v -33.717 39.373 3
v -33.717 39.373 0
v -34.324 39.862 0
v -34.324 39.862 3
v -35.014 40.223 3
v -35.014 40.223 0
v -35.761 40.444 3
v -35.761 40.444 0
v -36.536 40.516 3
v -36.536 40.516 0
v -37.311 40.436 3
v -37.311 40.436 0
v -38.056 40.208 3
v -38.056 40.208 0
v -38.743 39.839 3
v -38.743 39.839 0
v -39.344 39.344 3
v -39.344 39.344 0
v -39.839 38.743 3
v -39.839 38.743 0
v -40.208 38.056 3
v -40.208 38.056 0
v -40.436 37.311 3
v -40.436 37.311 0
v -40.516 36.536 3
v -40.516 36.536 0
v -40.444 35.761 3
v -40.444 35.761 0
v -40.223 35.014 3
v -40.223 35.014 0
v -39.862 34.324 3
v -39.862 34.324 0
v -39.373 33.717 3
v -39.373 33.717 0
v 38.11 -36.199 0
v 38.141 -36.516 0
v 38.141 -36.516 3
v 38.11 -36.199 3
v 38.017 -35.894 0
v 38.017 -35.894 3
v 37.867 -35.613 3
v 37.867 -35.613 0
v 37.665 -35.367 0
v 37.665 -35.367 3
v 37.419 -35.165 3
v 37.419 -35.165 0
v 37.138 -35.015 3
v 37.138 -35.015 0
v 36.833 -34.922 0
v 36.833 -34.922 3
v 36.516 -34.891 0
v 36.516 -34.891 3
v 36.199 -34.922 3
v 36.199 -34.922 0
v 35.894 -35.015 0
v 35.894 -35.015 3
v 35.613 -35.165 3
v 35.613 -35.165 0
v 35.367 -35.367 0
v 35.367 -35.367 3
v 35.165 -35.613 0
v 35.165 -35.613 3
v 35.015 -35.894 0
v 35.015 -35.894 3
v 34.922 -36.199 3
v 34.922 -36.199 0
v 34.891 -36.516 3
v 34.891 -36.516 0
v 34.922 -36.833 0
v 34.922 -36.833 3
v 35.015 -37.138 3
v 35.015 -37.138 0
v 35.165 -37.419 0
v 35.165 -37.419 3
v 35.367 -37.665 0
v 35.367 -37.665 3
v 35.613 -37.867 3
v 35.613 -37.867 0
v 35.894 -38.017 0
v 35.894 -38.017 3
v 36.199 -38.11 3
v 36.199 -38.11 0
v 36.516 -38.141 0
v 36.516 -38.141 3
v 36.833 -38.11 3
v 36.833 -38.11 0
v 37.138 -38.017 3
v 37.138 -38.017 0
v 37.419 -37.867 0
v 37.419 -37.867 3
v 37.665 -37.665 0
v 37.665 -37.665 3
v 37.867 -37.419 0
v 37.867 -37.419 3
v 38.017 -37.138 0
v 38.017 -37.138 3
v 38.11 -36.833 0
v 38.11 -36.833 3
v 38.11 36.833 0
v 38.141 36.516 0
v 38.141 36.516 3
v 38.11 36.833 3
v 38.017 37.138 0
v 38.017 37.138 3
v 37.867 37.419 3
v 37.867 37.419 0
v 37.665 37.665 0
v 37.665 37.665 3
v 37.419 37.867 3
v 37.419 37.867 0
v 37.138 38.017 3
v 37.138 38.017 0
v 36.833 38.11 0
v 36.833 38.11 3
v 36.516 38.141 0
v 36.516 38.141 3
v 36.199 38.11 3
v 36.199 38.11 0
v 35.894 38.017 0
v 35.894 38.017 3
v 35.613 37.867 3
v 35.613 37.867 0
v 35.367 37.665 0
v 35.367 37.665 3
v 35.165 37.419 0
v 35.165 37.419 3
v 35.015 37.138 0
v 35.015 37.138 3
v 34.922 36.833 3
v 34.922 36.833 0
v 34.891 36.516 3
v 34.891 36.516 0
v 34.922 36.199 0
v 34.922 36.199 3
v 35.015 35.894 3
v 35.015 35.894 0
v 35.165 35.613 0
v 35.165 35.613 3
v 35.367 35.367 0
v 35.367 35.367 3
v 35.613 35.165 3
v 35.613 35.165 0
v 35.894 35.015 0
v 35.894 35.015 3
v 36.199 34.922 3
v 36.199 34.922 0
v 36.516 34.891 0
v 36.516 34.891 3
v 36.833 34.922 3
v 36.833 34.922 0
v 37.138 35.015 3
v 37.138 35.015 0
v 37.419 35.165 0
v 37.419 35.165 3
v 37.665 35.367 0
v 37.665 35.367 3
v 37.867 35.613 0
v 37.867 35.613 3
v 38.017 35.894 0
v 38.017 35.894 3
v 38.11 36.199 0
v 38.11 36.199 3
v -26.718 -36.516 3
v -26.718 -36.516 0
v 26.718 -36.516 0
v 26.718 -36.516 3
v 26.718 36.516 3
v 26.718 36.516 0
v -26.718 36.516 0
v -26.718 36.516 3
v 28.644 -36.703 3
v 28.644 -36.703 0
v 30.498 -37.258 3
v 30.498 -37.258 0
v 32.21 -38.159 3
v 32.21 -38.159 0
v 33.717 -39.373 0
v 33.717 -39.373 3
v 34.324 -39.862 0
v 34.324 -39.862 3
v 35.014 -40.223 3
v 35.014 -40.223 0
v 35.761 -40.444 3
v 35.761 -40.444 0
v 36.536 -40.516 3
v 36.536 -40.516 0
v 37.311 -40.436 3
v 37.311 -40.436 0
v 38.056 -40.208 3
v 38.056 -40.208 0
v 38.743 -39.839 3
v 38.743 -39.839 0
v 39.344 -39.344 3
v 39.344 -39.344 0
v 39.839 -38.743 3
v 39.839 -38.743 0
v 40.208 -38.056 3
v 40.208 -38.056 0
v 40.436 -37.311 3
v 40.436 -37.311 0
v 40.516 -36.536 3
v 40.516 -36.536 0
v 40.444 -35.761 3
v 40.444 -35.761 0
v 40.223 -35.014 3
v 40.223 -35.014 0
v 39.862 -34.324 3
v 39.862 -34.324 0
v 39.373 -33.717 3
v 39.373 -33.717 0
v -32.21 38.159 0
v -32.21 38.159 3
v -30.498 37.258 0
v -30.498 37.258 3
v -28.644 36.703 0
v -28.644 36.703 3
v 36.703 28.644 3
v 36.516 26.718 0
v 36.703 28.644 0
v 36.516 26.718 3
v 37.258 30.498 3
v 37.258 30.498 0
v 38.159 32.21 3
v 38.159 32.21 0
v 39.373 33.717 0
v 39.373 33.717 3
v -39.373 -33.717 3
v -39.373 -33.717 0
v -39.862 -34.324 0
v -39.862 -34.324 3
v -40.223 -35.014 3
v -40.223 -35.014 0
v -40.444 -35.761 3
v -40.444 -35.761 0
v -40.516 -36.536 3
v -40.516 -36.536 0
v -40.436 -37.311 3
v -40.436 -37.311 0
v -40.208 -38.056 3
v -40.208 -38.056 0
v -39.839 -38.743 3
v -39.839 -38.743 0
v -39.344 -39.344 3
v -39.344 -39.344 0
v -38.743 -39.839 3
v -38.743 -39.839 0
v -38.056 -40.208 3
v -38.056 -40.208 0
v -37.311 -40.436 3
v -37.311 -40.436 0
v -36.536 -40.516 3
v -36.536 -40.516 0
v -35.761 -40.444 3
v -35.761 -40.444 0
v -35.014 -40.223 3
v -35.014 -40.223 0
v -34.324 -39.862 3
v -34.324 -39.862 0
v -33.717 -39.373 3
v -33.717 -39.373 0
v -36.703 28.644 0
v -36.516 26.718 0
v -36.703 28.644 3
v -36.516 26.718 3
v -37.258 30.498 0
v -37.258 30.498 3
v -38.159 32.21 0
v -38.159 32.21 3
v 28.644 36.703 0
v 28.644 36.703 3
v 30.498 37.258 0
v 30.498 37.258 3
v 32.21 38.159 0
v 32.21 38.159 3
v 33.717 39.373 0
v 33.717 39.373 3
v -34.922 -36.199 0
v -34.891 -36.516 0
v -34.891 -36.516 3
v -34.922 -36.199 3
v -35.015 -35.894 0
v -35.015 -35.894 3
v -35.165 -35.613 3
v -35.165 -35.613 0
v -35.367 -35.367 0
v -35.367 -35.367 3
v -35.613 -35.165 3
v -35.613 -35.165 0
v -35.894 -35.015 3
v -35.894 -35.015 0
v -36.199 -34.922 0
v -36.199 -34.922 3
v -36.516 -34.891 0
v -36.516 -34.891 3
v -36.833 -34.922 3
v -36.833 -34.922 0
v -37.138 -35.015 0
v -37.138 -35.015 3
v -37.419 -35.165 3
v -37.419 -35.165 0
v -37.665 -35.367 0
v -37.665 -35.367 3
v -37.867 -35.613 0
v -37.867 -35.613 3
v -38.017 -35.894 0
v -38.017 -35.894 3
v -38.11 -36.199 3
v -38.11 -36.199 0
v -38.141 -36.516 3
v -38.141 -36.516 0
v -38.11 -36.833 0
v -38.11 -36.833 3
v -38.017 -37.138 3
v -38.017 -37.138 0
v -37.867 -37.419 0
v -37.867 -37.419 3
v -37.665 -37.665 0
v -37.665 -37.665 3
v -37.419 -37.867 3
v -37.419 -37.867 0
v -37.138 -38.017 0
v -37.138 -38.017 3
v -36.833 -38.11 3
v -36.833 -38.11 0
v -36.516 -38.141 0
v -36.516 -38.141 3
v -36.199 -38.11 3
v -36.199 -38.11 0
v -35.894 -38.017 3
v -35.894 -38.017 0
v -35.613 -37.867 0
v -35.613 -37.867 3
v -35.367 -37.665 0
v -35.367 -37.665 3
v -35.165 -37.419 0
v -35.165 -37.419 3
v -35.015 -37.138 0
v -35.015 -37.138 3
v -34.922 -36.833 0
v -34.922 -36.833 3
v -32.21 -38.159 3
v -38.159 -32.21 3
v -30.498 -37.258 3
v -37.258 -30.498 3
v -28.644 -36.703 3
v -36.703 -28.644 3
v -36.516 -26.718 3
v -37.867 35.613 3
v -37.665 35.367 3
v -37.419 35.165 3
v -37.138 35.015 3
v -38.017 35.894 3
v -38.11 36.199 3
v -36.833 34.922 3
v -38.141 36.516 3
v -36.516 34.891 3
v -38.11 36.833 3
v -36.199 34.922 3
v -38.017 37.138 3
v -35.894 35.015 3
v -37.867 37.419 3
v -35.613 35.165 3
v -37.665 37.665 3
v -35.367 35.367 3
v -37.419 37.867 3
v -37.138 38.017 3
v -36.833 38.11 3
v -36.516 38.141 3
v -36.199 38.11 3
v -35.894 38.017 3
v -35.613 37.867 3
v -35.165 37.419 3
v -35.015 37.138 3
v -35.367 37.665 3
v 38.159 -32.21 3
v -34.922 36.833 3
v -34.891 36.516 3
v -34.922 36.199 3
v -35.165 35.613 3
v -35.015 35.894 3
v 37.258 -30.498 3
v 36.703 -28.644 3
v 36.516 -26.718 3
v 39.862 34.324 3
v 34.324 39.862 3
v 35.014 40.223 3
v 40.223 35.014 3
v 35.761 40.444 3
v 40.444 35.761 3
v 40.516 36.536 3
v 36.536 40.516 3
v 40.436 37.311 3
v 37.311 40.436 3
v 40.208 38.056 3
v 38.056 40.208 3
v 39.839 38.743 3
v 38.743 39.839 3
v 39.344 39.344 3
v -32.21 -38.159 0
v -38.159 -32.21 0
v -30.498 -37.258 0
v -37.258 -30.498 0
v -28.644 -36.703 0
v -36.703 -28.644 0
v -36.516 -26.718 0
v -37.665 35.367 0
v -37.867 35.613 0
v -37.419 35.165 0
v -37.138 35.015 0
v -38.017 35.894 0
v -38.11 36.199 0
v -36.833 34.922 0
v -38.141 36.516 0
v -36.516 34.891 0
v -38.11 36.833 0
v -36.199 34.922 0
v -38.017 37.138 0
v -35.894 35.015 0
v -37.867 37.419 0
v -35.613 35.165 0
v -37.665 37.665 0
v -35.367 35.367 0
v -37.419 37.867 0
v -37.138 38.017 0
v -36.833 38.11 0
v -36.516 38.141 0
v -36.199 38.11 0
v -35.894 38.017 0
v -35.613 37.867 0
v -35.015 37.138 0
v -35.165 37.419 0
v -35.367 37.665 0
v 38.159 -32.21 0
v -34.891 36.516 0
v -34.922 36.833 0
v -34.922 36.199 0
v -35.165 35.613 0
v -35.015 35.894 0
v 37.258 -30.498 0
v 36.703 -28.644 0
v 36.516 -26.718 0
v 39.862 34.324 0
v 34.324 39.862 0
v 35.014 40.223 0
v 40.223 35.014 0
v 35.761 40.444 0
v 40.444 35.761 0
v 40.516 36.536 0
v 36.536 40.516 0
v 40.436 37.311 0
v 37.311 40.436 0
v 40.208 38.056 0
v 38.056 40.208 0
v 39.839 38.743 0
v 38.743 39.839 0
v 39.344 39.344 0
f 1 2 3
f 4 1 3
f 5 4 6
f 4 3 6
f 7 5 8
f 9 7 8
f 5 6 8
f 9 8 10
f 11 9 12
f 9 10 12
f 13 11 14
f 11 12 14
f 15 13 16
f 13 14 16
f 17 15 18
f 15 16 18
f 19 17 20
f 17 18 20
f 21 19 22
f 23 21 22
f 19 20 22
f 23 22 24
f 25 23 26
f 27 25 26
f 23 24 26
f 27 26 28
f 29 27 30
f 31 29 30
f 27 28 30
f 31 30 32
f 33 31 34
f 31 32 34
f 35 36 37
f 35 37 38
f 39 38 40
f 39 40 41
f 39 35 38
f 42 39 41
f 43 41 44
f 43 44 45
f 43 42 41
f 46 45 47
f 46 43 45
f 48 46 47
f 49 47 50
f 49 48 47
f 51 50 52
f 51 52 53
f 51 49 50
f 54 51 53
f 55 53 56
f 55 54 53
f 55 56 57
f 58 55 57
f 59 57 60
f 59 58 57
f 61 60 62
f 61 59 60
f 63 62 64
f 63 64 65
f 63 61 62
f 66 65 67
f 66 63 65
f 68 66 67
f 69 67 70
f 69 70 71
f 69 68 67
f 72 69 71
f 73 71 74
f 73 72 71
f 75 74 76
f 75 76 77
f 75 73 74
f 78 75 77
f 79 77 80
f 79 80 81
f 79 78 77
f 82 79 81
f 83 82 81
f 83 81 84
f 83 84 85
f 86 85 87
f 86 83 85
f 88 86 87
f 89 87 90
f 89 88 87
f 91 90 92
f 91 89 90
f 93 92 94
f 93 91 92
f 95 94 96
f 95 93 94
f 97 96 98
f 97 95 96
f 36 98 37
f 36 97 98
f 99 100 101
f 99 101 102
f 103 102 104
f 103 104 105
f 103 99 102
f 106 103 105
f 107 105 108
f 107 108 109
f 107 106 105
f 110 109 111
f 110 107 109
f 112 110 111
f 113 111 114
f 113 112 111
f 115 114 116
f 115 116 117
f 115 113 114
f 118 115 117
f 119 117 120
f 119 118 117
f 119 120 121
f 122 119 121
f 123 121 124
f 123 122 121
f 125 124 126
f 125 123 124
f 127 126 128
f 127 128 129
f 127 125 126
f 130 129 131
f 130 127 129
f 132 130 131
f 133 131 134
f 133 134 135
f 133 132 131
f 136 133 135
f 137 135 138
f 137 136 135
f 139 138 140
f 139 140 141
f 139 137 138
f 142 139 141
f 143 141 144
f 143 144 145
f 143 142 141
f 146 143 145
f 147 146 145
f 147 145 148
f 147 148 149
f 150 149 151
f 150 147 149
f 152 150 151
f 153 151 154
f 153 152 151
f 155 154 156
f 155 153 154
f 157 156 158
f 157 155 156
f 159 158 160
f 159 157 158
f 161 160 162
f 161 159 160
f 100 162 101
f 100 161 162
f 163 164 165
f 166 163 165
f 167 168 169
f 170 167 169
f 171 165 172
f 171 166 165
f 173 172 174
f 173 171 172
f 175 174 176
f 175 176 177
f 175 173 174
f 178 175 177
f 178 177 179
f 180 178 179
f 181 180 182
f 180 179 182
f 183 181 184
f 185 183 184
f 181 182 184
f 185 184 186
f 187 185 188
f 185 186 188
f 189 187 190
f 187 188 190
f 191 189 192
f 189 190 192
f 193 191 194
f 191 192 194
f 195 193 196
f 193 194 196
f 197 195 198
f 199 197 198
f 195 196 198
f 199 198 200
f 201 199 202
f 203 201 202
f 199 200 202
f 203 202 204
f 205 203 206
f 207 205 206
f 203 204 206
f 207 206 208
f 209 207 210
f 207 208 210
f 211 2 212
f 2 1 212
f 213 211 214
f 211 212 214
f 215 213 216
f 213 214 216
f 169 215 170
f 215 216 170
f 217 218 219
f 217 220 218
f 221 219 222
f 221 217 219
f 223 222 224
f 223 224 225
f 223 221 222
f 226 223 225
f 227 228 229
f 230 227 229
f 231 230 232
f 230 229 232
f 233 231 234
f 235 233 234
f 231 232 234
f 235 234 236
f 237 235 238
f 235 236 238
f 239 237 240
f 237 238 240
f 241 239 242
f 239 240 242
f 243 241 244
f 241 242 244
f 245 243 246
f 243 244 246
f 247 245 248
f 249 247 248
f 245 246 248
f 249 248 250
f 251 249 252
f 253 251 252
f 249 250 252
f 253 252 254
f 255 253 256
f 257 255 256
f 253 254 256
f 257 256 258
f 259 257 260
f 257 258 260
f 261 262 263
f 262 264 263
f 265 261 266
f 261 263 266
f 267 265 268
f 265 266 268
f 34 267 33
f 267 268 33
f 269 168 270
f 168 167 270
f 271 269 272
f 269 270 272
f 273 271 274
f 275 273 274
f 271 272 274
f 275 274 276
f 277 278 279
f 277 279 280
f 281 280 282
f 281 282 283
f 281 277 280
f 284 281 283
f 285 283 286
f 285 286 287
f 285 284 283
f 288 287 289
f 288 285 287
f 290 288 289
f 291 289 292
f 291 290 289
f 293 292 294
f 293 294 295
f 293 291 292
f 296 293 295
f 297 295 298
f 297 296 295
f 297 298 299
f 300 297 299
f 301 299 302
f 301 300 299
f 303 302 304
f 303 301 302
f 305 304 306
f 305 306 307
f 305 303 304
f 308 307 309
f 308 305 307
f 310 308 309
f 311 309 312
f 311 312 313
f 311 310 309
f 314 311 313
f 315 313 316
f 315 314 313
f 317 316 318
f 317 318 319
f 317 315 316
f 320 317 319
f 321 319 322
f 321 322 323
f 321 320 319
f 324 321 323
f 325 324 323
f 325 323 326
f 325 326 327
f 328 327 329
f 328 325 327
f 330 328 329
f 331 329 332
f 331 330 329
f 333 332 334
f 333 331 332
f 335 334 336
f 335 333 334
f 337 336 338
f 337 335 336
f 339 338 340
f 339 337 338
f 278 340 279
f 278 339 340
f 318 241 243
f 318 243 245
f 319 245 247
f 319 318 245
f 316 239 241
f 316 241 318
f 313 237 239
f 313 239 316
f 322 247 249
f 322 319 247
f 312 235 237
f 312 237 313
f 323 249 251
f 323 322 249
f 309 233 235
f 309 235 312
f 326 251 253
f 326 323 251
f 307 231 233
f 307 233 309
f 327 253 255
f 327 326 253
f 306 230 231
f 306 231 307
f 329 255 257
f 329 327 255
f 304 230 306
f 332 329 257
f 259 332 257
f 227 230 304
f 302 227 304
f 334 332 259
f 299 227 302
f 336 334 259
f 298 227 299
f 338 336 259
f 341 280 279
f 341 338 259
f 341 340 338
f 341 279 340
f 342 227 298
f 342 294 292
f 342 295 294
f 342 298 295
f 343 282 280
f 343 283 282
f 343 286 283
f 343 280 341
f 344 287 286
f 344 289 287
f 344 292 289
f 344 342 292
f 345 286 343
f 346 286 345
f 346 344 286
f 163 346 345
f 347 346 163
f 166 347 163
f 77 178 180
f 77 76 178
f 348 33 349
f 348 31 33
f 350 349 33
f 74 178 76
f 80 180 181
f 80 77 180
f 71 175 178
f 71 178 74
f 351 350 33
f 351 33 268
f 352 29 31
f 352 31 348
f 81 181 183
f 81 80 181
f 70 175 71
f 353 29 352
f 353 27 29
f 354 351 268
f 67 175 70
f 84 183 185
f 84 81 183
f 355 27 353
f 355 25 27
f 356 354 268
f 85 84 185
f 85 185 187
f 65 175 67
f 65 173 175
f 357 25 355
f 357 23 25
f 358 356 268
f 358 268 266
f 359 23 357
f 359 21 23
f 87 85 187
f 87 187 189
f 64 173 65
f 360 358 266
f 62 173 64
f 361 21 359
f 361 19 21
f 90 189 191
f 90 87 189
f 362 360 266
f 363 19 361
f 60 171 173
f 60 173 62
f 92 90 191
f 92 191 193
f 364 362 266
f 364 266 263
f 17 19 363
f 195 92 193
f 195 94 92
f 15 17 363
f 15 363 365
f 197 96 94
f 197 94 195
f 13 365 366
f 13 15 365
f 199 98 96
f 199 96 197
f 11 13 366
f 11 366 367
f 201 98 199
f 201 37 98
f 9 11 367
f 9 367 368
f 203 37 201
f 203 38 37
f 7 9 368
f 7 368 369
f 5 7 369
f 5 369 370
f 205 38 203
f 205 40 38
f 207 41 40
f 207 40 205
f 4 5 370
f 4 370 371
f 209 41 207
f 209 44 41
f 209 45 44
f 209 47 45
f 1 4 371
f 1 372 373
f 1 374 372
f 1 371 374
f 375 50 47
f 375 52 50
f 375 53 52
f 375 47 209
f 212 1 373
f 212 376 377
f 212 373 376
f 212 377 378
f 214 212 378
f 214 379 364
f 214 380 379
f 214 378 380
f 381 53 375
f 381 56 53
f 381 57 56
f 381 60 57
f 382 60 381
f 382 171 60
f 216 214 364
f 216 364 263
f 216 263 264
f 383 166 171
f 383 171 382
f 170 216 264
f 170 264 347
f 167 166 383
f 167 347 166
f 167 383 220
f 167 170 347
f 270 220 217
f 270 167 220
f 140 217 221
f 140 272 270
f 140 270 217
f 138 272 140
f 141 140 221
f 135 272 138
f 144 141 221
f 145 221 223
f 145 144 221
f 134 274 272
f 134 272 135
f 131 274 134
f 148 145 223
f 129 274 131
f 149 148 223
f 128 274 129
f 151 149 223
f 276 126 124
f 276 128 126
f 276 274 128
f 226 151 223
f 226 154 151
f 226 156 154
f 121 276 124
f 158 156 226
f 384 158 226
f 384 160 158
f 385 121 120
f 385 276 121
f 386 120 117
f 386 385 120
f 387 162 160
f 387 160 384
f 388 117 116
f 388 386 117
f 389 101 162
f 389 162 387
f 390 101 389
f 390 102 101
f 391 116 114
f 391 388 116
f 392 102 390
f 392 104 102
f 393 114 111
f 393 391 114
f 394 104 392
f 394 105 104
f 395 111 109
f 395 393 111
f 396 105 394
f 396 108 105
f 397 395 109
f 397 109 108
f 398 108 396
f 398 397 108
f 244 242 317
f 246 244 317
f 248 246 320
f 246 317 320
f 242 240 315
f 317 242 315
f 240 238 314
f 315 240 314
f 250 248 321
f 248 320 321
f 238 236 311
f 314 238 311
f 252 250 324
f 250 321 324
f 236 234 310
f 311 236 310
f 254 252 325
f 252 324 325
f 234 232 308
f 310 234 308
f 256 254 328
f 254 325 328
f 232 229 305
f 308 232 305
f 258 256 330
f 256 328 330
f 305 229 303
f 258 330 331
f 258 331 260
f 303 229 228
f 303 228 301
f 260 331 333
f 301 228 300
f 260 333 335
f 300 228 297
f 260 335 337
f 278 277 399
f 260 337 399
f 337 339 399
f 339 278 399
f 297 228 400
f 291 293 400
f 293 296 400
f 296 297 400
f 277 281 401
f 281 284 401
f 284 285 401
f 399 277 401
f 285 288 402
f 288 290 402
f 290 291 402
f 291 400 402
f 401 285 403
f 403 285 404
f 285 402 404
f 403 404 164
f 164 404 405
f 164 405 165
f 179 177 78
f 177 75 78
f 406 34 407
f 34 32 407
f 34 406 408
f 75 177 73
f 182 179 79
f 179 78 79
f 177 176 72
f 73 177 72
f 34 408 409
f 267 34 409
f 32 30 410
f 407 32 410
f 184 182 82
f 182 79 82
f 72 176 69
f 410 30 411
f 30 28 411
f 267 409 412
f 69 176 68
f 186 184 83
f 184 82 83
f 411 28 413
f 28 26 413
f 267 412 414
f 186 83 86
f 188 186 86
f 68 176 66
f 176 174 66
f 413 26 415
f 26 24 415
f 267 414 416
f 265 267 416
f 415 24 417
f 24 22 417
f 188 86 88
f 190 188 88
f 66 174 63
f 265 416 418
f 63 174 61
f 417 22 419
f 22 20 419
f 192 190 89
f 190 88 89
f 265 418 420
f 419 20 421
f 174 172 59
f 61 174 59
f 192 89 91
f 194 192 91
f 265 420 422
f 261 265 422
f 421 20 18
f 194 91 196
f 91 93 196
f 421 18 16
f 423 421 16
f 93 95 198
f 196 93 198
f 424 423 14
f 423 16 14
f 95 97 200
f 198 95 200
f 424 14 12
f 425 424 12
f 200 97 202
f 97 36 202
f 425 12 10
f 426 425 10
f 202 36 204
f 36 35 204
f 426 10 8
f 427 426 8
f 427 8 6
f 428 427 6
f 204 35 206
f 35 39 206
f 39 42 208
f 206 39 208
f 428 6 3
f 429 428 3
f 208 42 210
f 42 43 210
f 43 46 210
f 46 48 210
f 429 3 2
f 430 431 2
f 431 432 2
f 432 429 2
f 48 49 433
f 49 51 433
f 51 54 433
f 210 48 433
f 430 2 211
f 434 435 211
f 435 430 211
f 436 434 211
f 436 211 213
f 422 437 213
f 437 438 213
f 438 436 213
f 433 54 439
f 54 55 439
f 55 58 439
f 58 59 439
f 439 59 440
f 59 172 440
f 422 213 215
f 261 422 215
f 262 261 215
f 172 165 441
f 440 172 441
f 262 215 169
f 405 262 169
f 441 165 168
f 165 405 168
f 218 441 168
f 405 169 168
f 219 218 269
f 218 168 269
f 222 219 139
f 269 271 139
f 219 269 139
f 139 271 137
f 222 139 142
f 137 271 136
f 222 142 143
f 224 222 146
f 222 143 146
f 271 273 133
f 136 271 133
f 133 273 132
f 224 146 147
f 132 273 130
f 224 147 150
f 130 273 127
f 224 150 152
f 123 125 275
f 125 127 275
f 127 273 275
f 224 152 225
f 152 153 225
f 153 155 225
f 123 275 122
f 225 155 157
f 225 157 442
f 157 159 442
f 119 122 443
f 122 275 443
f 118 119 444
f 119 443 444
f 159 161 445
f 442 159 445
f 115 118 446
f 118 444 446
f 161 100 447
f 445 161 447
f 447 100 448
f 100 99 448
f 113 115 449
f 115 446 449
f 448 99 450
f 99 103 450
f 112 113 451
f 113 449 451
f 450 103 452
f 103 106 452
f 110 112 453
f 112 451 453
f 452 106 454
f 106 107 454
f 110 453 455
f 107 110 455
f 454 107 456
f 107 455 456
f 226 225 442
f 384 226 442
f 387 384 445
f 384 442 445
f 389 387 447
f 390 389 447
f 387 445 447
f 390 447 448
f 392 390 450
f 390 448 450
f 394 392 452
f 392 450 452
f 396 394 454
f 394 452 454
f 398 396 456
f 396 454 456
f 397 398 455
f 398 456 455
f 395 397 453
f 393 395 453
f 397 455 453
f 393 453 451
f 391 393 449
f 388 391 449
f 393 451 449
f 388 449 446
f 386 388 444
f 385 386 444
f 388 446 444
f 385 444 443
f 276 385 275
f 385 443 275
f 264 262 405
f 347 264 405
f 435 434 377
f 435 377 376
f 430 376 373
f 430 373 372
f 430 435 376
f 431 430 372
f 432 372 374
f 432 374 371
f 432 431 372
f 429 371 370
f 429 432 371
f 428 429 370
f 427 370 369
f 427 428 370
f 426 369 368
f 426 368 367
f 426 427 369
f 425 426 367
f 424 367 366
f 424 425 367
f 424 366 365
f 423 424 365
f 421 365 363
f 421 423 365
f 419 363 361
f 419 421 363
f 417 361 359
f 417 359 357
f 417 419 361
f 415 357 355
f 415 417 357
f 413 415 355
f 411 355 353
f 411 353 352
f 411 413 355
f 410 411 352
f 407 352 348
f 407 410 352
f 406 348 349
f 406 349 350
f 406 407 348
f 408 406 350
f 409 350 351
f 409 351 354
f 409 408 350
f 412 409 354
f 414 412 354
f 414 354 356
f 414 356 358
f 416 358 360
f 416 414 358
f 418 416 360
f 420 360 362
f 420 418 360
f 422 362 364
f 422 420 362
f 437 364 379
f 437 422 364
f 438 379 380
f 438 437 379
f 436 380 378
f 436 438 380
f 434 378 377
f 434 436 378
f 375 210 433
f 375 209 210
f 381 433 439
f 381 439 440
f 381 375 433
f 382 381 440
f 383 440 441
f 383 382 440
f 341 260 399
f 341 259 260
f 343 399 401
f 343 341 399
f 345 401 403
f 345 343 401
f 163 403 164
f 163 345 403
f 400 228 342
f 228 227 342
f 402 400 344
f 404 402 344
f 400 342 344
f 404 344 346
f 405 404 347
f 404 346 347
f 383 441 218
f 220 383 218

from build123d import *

# Parameters (mm, degrees)
SKETCH_1_R      = 1.625
EXTRUDE_1_DEPTH = 3
FILLET_1_R      = 10


with BuildPart() as part:
    # Эскиз1 → Бобышка-Вытянуть1 (new body)
    with BuildSketch(Plane.XY):
        with BuildLine():
            ThreePointArc((-36.516055554, -32.516055554), (-39.344482678, -39.344482678), (-32.516055554, -36.516055554))
            Line((-32.516055554, -36.516055554), (32.516055554, -36.516055554))
            ThreePointArc((32.516055554, -36.516055554), (39.344482678, -39.344482678), (36.516055554, -32.516055554))
            Line((36.516055554, -32.516055554), (36.516055554, 32.516055554))
            ThreePointArc((36.516055554, 32.516055554), (39.344482678, 39.344482678), (32.516055554, 36.516055554))
            Line((32.516055554, 36.516055554), (-32.516055554, 36.516055554))
            ThreePointArc((-32.516055554, 36.516055554), (-39.344482678, 39.344482678), (-36.516055554, 32.516055554))
            Line((-36.516055554, 32.516055554), (-36.516055554, -32.516055554))
        make_face()
        with Locations((-36.516055554, -36.516055554)):
            Circle(SKETCH_1_R, mode=Mode.SUBTRACT)
        with Locations((36.516055554, 36.516055554)):
            Circle(SKETCH_1_R, mode=Mode.SUBTRACT)
        with Locations((-36.516055554, 36.516055554)):
            Circle(SKETCH_1_R, mode=Mode.SUBTRACT)
        with Locations((36.516055554, -36.516055554)):
            Circle(SKETCH_1_R, mode=Mode.SUBTRACT)
    extrude(amount=EXTRUDE_1_DEPTH)

    # Скругление1
    fillet_1_edges = [part.edges().sort_by_distance(p)[0] for p in [
        (-36.516055554, -32.516055554, 1.5),
        (-36.516055554, 32.516055554, 1.5),
        (-32.516055554, 36.516055554, 1.5),
        (32.516055554, 36.516055554, 1.5),
        (36.516055554, 32.516055554, 1.5),
        (36.516055554, -32.516055554, 1.5),
        (32.516055554, -36.516055554, 1.5),
        (-32.516055554, -36.516055554, 1.5),
    ]]
    fillet(fillet_1_edges, radius=FILLET_1_R)


solid = part.part
